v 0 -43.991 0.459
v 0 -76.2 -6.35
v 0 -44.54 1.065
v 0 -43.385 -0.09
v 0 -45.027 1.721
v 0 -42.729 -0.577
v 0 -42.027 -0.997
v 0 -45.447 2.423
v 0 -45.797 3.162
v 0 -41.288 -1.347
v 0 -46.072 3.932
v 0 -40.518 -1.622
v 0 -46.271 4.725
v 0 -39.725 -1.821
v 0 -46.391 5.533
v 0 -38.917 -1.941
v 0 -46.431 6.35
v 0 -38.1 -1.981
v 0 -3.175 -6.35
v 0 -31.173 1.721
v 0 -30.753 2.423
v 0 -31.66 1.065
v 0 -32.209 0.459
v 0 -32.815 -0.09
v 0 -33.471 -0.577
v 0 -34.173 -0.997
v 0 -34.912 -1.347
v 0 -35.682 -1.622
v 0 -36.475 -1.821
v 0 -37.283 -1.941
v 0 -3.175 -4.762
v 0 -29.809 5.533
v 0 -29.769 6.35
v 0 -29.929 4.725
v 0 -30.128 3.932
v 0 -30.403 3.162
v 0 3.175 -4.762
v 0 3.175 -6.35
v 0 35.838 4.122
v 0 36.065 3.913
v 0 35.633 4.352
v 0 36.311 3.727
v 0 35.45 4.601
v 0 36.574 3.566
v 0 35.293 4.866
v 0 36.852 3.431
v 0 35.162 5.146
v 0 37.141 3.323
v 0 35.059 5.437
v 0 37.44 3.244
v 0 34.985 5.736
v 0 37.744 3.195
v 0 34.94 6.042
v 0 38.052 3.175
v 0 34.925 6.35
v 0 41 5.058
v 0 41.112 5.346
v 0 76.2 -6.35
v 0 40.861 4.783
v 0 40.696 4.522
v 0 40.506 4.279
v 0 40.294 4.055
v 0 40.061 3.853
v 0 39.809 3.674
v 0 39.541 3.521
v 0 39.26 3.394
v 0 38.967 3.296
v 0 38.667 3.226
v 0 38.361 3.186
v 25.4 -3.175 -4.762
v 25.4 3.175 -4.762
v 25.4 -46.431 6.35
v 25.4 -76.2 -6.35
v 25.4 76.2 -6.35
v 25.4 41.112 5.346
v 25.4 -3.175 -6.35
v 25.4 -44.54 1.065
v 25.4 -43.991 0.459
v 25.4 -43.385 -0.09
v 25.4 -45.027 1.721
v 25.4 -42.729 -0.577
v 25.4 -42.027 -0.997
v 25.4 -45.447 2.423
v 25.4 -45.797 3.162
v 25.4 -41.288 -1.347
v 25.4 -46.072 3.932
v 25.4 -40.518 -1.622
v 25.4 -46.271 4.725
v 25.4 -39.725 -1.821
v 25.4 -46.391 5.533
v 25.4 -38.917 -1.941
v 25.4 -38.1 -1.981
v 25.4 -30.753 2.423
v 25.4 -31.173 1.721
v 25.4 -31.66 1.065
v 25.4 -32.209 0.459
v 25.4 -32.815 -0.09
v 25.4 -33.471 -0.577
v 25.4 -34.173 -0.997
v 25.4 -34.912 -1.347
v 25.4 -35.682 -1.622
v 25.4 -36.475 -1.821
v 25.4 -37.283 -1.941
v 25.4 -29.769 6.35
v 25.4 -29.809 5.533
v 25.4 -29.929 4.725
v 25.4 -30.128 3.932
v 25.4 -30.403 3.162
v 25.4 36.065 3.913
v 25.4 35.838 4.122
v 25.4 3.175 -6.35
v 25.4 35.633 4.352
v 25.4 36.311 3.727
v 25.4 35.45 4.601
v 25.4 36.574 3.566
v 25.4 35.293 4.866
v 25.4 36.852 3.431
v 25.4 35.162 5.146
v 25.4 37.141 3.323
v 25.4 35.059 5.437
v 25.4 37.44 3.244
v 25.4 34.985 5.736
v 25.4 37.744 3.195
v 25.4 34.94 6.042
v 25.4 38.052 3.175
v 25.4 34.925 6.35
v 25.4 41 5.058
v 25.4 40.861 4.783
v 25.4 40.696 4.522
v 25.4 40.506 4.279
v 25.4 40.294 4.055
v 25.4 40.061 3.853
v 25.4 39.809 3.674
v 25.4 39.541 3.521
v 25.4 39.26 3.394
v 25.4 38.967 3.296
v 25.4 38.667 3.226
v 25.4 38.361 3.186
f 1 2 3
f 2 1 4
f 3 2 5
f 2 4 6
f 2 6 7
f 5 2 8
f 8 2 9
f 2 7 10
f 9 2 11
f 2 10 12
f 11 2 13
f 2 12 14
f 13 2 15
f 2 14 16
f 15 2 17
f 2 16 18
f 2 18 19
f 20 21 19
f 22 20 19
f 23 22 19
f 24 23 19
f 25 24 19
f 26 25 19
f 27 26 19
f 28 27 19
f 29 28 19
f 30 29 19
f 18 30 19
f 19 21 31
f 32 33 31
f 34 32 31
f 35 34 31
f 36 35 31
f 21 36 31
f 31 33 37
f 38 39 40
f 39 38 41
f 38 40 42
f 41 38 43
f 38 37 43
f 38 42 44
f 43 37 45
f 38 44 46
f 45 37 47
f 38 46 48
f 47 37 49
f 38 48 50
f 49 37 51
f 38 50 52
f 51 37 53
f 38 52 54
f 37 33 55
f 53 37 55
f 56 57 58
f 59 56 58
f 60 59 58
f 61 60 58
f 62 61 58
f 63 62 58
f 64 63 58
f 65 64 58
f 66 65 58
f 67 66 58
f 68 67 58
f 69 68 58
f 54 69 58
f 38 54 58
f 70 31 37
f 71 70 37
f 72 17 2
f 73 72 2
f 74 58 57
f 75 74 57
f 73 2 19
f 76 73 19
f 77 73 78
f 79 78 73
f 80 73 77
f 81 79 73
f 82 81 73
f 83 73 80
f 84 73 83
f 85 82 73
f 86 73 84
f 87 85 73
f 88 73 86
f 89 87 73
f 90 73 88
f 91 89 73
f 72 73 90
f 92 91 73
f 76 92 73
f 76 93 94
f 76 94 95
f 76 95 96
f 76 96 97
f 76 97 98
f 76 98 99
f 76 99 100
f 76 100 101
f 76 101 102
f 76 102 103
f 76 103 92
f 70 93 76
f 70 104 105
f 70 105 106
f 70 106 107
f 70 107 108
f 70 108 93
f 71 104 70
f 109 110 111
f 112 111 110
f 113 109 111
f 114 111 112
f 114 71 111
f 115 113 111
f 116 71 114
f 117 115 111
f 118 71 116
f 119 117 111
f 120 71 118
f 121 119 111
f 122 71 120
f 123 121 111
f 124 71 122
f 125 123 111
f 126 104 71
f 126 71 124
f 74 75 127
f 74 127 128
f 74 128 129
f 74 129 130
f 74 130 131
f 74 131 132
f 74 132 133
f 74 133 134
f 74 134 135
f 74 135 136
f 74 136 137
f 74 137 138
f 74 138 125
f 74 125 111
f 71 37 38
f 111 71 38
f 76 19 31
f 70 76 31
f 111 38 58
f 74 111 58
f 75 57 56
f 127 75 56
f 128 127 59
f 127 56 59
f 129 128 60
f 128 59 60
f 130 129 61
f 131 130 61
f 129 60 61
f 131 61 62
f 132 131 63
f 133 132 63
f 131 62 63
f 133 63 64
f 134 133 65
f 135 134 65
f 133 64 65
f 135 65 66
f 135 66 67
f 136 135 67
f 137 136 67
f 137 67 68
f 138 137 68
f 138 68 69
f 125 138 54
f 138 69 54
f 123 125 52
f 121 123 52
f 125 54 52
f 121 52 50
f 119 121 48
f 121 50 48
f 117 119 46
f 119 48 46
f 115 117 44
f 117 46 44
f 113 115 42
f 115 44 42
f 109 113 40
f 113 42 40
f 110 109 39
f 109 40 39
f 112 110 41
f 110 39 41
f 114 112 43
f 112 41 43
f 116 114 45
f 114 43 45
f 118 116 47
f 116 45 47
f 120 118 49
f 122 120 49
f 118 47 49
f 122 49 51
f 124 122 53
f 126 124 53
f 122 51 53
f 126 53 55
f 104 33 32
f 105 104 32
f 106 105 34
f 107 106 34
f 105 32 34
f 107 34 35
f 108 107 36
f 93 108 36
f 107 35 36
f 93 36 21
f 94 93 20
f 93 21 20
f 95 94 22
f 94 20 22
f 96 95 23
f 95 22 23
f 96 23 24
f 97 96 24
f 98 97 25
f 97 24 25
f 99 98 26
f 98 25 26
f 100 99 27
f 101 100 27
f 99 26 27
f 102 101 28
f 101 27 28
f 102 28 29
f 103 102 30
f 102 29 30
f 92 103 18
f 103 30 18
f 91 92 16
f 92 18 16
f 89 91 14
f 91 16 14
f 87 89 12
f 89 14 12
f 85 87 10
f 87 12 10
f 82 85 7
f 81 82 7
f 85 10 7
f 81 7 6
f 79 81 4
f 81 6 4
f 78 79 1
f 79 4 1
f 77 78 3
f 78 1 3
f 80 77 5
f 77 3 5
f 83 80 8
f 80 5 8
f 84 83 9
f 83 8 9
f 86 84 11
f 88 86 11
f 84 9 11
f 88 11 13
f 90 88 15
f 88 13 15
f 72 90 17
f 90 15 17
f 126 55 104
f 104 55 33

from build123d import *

# Parameters (mm, degrees)
F1_DEPTH = 25.4


# Not quite as in the source:
# - a feature names something its author has since deleted; it is built from what else it names


with BuildPart() as f1:
    # F0 (on Right) → F1 (new body)
    with BuildSketch(Plane.YZ):
        with BuildLine():
            ThreePointArc((41.1120694713, 5.3459768429), (37.5914213785, 3.215997322), (34.925, 6.35))
            Line((34.925, 6.35), (3.175, 6.35))
            Line((3.175, 6.35), (-3.175, 6.35))
            Line((-3.175, 6.35), (-29.7688, 6.35))
            ThreePointArc((-29.7688, 6.35), (-38.1, -1.9812), (-46.4312, 6.35))
            Line((-46.4312, 6.35), (-76.2, -6.35))
            Line((-76.2, -6.35), (-3.175, -6.35))
            Line((-3.175, -6.35), (-3.175, -4.7625))
            Line((-3.175, -4.7625), (0, -4.7625))
            Line((0, -4.7625), (3.175, -4.7625))
            Line((3.175, -4.7625), (3.175, -6.35))
            Line((3.175, -6.35), (76.2, -6.35))
            Line((76.2, -6.35), (41.1120694713, 5.3459768429))
        make_face()
    extrude(amount=F1_DEPTH)


solid = f1.part
